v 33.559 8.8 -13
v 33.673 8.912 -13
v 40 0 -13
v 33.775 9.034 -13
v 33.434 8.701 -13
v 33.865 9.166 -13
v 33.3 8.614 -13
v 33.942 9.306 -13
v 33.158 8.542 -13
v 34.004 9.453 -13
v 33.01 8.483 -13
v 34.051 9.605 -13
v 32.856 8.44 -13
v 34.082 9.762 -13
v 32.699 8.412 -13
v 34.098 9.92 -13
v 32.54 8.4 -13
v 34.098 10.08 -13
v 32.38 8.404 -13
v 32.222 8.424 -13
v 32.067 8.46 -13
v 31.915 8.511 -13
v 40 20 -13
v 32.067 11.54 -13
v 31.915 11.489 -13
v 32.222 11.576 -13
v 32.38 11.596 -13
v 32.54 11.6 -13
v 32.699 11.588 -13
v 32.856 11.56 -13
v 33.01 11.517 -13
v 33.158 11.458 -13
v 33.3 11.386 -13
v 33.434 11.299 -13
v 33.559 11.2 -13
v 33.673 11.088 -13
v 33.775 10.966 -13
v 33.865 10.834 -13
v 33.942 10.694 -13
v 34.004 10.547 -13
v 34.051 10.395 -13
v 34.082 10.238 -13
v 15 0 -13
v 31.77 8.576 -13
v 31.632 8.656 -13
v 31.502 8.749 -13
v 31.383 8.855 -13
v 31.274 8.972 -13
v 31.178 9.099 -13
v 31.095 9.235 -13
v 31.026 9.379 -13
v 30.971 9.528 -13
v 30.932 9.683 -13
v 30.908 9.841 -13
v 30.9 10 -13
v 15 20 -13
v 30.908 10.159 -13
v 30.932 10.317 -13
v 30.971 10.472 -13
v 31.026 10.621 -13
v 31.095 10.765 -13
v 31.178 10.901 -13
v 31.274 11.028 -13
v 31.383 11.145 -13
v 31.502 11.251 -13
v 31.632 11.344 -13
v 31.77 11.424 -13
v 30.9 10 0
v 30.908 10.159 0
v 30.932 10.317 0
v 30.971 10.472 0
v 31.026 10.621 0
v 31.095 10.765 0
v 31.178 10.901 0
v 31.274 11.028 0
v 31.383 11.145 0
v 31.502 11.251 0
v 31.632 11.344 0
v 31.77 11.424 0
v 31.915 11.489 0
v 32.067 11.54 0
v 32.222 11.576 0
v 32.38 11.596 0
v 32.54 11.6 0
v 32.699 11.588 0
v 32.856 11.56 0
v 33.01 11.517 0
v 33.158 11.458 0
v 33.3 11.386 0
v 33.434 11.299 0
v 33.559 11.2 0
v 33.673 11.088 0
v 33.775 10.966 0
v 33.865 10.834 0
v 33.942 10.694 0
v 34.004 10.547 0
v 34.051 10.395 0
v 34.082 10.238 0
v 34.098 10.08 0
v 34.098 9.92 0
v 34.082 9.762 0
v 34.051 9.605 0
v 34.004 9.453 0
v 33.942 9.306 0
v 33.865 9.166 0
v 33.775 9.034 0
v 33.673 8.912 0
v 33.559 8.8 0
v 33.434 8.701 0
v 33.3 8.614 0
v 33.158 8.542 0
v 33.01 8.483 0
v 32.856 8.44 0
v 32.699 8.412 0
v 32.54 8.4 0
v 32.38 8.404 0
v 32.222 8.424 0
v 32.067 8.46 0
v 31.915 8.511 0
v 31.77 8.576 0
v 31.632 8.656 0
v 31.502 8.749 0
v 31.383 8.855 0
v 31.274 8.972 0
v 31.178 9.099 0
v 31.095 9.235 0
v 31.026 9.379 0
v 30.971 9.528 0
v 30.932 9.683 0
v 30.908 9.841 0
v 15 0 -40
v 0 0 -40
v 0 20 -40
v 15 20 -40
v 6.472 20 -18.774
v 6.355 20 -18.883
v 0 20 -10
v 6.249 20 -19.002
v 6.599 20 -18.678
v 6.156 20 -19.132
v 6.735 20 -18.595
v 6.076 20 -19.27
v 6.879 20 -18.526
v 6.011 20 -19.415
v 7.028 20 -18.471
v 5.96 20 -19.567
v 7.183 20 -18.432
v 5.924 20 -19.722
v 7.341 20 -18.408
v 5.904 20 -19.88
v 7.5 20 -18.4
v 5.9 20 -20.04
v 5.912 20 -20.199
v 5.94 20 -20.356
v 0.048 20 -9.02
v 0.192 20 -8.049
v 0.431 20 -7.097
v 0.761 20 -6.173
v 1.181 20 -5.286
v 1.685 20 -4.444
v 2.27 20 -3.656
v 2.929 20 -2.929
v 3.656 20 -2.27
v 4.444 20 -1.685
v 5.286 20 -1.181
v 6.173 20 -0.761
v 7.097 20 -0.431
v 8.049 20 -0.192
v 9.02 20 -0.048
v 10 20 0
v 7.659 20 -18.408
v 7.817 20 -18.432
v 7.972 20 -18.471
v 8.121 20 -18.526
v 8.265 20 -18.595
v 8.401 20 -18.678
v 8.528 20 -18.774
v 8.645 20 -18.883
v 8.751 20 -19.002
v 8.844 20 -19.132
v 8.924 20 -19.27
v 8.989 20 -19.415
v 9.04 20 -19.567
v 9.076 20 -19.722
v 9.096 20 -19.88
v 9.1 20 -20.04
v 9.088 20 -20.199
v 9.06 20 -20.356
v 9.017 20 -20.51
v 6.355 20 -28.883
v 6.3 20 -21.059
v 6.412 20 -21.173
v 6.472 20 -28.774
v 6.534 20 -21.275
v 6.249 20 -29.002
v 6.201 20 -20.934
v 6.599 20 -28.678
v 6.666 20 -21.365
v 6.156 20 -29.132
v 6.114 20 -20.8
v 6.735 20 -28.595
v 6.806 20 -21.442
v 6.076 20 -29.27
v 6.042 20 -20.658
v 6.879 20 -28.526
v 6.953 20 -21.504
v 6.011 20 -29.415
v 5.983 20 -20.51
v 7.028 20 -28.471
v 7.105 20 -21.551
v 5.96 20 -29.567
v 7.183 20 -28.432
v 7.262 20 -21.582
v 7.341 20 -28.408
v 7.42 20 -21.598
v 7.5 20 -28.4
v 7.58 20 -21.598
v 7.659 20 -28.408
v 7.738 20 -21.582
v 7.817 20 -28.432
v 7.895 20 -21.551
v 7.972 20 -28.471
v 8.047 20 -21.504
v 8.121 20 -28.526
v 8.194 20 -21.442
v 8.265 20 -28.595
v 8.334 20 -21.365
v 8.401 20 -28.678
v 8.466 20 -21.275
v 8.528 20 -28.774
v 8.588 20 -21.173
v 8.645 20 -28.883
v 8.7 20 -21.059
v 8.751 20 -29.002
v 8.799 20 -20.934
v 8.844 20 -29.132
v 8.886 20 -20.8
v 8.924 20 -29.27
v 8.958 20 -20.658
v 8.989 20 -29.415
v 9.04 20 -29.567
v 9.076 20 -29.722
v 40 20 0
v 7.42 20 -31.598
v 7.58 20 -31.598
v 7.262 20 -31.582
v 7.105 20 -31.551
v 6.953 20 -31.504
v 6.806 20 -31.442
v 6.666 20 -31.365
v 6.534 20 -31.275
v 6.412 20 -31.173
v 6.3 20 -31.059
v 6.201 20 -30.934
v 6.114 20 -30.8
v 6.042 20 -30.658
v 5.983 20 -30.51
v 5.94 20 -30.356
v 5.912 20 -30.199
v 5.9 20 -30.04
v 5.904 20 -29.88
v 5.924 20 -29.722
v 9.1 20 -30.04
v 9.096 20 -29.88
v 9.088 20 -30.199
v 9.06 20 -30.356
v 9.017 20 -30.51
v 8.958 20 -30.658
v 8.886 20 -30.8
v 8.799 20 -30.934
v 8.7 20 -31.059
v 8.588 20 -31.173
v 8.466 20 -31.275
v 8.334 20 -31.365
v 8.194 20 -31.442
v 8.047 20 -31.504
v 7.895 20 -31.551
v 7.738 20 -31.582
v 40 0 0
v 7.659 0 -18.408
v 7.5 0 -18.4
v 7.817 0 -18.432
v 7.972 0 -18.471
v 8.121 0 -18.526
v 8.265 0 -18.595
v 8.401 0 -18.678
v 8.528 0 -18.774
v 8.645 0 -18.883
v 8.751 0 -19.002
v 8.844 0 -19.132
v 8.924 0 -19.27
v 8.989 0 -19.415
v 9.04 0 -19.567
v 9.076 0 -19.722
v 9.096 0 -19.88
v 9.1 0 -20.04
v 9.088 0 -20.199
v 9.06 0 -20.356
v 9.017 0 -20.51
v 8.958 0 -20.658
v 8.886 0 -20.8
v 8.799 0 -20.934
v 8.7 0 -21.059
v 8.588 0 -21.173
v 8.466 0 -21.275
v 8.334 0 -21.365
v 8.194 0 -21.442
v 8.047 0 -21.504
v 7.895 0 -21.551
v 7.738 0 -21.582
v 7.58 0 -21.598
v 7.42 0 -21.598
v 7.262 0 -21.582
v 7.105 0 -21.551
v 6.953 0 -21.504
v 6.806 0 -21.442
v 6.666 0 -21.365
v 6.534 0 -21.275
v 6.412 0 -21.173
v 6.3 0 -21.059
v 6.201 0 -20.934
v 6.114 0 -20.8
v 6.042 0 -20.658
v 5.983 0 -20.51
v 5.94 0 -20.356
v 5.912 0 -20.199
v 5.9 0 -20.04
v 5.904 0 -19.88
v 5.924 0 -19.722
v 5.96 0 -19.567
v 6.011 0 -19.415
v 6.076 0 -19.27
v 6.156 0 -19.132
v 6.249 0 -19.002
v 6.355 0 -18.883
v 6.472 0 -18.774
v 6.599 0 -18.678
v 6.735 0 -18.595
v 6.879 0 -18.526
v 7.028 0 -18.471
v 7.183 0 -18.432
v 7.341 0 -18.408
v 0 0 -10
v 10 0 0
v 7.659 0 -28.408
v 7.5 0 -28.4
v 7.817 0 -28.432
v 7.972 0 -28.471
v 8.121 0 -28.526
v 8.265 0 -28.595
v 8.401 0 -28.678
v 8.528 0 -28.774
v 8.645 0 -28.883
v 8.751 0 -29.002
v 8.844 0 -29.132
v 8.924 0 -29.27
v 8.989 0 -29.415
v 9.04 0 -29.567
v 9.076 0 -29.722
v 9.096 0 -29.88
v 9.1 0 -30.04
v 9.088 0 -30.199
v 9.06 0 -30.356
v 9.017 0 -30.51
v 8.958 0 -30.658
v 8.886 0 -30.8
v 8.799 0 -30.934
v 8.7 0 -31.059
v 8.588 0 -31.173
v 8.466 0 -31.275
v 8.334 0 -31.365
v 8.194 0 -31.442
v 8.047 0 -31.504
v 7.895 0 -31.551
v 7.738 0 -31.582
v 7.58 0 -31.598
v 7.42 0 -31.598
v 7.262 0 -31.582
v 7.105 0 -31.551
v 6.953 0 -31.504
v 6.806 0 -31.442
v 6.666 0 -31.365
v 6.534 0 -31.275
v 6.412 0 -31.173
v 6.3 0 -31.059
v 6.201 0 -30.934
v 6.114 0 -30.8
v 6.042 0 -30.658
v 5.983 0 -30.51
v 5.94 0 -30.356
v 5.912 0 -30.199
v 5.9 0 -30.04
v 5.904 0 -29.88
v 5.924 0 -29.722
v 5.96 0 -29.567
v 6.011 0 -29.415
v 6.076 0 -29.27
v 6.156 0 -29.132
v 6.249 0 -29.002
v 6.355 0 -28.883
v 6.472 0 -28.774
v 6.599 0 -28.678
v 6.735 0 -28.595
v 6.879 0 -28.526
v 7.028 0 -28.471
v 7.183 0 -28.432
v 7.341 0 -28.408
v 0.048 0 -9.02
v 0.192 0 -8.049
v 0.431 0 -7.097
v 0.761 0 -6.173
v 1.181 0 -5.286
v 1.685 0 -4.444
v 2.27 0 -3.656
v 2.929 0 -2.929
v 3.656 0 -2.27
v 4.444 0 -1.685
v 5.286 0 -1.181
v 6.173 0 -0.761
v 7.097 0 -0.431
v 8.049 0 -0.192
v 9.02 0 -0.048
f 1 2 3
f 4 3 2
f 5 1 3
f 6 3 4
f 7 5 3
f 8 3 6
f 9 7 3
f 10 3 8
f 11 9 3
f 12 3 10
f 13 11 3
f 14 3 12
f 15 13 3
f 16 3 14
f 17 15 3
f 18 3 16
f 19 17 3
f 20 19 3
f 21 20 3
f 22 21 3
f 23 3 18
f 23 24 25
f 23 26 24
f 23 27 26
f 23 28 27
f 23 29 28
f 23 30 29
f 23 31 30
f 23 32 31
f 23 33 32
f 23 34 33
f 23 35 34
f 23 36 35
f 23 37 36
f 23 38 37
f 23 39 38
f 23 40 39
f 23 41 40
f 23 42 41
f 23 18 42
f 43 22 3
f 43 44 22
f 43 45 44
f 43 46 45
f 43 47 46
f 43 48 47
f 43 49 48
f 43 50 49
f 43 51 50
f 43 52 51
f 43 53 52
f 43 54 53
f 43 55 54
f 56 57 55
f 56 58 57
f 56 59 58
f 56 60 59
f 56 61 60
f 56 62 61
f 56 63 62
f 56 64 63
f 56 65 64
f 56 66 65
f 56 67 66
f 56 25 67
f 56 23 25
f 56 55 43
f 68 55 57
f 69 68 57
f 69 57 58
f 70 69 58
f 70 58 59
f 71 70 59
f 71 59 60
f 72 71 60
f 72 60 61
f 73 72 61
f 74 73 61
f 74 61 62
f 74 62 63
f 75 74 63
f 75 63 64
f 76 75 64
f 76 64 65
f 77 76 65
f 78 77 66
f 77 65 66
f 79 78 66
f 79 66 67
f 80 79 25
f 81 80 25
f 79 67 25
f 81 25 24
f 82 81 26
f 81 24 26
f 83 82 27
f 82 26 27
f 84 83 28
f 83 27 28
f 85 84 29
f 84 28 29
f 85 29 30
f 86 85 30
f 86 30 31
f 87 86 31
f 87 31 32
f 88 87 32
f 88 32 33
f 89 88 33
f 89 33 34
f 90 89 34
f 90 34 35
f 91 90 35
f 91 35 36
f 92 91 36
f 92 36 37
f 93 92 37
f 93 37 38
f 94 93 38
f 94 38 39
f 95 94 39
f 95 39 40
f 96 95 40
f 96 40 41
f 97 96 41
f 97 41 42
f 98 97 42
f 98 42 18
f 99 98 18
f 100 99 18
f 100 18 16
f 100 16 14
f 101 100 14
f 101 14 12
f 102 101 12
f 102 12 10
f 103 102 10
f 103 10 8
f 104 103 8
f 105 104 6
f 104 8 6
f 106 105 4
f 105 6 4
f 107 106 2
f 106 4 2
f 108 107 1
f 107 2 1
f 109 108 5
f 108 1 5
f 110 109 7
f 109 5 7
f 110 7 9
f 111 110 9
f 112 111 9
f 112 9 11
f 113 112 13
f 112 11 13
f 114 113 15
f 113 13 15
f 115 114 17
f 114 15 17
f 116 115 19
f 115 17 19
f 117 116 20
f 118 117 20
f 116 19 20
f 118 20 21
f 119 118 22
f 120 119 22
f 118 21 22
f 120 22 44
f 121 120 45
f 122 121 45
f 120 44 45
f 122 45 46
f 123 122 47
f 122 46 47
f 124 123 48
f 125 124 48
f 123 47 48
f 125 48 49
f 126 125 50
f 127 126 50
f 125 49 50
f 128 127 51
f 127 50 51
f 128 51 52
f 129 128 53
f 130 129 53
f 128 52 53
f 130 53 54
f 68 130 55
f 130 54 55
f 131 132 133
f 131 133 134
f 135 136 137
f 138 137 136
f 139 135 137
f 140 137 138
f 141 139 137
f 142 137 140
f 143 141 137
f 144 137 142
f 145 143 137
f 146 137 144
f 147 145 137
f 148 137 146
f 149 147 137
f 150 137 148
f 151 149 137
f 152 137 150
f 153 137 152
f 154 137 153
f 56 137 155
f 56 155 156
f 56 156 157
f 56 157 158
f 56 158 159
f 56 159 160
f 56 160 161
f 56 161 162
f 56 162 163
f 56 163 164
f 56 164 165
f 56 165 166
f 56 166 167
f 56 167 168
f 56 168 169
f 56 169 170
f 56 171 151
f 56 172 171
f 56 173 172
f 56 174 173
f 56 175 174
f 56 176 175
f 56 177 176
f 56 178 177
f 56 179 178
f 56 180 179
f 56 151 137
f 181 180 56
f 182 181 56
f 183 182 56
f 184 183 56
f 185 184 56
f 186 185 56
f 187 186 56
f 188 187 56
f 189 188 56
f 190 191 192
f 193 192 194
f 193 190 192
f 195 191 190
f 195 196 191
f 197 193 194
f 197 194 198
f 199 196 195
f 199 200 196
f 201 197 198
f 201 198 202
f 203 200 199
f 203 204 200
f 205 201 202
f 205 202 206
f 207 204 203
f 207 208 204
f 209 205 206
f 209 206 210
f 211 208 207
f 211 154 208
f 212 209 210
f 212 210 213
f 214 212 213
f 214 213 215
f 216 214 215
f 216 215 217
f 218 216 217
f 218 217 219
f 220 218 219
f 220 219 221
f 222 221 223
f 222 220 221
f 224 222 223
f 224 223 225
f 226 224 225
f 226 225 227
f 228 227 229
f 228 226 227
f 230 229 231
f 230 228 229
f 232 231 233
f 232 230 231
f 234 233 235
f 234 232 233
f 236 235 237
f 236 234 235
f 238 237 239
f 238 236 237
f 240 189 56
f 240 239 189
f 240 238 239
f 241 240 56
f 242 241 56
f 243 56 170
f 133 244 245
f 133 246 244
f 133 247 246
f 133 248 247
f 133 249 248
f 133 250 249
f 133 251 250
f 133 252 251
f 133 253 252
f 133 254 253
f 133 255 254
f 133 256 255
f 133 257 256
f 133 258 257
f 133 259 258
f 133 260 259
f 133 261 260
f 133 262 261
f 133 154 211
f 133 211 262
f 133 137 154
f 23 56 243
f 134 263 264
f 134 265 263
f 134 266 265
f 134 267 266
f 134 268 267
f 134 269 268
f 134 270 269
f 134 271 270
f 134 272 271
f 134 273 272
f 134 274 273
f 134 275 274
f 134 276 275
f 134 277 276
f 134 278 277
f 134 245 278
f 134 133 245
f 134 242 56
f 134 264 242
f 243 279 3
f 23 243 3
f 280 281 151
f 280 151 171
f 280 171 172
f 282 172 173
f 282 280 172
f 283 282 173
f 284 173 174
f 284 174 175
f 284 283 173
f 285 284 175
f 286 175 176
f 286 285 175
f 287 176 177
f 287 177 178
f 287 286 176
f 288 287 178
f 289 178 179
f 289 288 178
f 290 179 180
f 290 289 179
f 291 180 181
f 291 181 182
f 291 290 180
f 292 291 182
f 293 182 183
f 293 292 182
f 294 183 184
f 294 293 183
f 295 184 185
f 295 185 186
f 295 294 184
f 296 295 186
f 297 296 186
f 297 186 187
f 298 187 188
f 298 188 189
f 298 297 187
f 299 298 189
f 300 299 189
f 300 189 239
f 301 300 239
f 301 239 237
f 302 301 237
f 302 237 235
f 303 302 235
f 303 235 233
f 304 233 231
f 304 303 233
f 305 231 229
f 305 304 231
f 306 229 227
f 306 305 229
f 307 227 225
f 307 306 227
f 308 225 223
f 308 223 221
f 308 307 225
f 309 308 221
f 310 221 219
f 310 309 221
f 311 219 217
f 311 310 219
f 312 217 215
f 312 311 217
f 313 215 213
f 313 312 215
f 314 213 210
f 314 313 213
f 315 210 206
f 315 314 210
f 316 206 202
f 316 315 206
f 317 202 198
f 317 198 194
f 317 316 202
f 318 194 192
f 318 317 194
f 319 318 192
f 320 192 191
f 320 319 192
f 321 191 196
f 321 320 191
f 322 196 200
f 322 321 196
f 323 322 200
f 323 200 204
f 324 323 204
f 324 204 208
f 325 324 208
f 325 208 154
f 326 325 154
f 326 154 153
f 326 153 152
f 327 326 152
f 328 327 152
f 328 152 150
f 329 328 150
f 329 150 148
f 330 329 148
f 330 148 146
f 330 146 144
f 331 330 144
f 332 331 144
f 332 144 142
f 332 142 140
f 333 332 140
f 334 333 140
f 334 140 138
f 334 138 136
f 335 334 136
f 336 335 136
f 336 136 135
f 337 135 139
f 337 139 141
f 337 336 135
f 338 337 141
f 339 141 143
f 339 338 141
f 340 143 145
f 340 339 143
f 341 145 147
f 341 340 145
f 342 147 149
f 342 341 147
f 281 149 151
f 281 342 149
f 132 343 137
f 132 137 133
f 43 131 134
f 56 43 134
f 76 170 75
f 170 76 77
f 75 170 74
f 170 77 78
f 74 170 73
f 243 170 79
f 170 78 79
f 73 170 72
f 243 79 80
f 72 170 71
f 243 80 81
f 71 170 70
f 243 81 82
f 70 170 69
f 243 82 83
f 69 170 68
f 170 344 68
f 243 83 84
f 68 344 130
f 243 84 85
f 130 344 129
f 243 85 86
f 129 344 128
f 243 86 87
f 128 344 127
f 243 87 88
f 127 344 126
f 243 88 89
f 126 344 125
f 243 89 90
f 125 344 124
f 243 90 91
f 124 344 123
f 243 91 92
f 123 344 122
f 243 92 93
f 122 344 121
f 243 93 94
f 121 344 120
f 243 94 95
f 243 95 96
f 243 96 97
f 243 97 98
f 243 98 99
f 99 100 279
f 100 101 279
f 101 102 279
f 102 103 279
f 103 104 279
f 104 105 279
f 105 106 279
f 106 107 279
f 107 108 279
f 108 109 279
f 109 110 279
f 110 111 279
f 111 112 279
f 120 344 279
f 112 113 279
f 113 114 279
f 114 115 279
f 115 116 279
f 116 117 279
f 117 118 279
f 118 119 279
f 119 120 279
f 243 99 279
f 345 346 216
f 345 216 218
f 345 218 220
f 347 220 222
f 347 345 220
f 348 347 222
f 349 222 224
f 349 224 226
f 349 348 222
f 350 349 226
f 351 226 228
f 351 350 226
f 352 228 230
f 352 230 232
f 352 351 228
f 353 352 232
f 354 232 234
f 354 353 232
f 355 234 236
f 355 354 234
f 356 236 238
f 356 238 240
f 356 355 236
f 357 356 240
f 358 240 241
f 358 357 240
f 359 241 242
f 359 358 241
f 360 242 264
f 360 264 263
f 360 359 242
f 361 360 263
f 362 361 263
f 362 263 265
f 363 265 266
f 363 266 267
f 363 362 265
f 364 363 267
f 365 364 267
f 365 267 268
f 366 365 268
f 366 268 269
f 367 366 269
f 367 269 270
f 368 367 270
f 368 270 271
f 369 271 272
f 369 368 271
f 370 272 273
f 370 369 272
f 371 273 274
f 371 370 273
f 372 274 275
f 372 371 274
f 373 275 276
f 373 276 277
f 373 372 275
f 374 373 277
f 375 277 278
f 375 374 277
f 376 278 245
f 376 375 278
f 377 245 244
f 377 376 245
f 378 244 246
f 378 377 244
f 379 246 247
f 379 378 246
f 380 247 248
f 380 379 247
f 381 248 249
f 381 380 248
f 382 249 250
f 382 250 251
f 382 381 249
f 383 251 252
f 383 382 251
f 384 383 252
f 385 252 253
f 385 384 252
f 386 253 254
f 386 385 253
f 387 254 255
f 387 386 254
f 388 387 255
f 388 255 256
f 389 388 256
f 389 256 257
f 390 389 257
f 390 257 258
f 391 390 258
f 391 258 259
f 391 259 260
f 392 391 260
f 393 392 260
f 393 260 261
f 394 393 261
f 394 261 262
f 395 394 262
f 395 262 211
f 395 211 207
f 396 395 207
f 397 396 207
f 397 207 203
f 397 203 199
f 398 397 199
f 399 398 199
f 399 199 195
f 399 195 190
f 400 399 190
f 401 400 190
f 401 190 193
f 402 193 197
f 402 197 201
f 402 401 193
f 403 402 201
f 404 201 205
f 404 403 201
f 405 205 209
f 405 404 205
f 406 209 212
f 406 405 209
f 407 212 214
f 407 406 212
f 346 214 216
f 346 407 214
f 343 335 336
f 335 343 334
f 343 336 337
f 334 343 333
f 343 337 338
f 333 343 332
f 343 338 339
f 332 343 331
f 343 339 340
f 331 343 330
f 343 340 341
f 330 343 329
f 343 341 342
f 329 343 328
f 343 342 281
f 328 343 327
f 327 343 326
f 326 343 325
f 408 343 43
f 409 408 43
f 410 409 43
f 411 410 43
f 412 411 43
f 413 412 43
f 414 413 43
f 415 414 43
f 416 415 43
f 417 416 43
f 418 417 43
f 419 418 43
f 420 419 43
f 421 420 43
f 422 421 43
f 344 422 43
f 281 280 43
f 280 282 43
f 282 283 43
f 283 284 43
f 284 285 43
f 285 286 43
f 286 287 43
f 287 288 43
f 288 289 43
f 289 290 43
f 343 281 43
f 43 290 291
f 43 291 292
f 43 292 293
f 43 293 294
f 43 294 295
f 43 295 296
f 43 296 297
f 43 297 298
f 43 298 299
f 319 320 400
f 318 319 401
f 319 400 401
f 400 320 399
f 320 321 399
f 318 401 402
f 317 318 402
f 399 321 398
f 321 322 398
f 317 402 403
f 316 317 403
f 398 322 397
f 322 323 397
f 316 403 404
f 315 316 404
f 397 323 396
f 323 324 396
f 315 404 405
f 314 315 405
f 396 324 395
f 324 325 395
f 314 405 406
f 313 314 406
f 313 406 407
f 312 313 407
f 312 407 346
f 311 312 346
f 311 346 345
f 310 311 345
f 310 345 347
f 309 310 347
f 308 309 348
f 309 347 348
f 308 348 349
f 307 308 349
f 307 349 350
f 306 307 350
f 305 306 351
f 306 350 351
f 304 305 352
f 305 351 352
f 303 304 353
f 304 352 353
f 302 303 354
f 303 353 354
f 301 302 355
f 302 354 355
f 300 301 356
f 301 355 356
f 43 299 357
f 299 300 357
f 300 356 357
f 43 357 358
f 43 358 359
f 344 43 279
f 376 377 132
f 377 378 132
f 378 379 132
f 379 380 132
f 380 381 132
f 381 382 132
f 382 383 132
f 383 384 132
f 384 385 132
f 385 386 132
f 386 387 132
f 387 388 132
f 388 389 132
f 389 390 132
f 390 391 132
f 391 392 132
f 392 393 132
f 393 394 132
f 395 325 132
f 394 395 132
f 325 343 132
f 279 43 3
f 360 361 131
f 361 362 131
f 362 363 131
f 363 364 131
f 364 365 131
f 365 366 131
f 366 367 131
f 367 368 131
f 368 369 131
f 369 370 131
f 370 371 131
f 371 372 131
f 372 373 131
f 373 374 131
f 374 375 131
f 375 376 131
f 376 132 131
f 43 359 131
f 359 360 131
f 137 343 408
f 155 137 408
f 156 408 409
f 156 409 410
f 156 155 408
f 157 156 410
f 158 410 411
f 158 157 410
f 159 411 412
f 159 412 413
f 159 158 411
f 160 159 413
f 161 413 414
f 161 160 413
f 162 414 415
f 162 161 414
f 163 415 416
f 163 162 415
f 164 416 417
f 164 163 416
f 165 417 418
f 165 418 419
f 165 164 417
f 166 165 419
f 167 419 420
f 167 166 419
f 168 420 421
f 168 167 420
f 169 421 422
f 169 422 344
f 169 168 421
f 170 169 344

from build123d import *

# Parameters (mm, degrees)
SKETCH_1_W          = 40
SKETCH_1_H          = 40
SKETCH_1_R          = 1.6
EXTRUDE_1_DEPTH     = 20
SKETCH_2_R          = 1.6
CUT_EXTRUDE_1_DEPTH = 61
SKETCH_3_W          = 25
SKETCH_3_H          = 20
CUT_EXTRUDE_2_DEPTH = 27
FILLET_1_R          = 10


with BuildPart() as part:
    # 草图1 → 凸台-拉伸1 (new body)
    with BuildSketch(Plane(origin=(0, 0, 0), x_dir=(1, 0, 0), z_dir=(0, 1, 0))):
        with Locations((20, 20)):
            Rectangle(SKETCH_1_W, SKETCH_1_H)
        with Locations(Location((7.5, 30, 0), (0, 0, 270))):
            Circle(SKETCH_1_R, mode=Mode.SUBTRACT)
        with Locations(Location((7.5, 20, 0), (0, 0, 270))):
            Circle(SKETCH_1_R, mode=Mode.SUBTRACT)
    extrude(amount=EXTRUDE_1_DEPTH)

    # 草图2 → 切除-拉伸1 (cut, through all)
    with BuildSketch(Plane(origin=(0, 0, -40), x_dir=(-1, 0, 0), z_dir=(0, 0, -1))):
        with Locations((-32.5, 10)):
            Circle(SKETCH_2_R)
    extrude(amount=-CUT_EXTRUDE_1_DEPTH, mode=Mode.SUBTRACT)

    # 草图3 → 切除-拉伸2 (cut)
    with BuildSketch(Plane(origin=(0, 0, -40), x_dir=(-1, 0, 0), z_dir=(0, 0, -1))):
        with Locations((-27.5, 10)):
            Rectangle(SKETCH_3_W, SKETCH_3_H)
    extrude(amount=-CUT_EXTRUDE_2_DEPTH, mode=Mode.SUBTRACT)

    # 圆角1
    fillet_1_edges = [part.edges().sort_by_distance(p)[0] for p in [
        (0, 10, 0),
    ]]
    fillet(fillet_1_edges, radius=FILLET_1_R)


solid = part.part
